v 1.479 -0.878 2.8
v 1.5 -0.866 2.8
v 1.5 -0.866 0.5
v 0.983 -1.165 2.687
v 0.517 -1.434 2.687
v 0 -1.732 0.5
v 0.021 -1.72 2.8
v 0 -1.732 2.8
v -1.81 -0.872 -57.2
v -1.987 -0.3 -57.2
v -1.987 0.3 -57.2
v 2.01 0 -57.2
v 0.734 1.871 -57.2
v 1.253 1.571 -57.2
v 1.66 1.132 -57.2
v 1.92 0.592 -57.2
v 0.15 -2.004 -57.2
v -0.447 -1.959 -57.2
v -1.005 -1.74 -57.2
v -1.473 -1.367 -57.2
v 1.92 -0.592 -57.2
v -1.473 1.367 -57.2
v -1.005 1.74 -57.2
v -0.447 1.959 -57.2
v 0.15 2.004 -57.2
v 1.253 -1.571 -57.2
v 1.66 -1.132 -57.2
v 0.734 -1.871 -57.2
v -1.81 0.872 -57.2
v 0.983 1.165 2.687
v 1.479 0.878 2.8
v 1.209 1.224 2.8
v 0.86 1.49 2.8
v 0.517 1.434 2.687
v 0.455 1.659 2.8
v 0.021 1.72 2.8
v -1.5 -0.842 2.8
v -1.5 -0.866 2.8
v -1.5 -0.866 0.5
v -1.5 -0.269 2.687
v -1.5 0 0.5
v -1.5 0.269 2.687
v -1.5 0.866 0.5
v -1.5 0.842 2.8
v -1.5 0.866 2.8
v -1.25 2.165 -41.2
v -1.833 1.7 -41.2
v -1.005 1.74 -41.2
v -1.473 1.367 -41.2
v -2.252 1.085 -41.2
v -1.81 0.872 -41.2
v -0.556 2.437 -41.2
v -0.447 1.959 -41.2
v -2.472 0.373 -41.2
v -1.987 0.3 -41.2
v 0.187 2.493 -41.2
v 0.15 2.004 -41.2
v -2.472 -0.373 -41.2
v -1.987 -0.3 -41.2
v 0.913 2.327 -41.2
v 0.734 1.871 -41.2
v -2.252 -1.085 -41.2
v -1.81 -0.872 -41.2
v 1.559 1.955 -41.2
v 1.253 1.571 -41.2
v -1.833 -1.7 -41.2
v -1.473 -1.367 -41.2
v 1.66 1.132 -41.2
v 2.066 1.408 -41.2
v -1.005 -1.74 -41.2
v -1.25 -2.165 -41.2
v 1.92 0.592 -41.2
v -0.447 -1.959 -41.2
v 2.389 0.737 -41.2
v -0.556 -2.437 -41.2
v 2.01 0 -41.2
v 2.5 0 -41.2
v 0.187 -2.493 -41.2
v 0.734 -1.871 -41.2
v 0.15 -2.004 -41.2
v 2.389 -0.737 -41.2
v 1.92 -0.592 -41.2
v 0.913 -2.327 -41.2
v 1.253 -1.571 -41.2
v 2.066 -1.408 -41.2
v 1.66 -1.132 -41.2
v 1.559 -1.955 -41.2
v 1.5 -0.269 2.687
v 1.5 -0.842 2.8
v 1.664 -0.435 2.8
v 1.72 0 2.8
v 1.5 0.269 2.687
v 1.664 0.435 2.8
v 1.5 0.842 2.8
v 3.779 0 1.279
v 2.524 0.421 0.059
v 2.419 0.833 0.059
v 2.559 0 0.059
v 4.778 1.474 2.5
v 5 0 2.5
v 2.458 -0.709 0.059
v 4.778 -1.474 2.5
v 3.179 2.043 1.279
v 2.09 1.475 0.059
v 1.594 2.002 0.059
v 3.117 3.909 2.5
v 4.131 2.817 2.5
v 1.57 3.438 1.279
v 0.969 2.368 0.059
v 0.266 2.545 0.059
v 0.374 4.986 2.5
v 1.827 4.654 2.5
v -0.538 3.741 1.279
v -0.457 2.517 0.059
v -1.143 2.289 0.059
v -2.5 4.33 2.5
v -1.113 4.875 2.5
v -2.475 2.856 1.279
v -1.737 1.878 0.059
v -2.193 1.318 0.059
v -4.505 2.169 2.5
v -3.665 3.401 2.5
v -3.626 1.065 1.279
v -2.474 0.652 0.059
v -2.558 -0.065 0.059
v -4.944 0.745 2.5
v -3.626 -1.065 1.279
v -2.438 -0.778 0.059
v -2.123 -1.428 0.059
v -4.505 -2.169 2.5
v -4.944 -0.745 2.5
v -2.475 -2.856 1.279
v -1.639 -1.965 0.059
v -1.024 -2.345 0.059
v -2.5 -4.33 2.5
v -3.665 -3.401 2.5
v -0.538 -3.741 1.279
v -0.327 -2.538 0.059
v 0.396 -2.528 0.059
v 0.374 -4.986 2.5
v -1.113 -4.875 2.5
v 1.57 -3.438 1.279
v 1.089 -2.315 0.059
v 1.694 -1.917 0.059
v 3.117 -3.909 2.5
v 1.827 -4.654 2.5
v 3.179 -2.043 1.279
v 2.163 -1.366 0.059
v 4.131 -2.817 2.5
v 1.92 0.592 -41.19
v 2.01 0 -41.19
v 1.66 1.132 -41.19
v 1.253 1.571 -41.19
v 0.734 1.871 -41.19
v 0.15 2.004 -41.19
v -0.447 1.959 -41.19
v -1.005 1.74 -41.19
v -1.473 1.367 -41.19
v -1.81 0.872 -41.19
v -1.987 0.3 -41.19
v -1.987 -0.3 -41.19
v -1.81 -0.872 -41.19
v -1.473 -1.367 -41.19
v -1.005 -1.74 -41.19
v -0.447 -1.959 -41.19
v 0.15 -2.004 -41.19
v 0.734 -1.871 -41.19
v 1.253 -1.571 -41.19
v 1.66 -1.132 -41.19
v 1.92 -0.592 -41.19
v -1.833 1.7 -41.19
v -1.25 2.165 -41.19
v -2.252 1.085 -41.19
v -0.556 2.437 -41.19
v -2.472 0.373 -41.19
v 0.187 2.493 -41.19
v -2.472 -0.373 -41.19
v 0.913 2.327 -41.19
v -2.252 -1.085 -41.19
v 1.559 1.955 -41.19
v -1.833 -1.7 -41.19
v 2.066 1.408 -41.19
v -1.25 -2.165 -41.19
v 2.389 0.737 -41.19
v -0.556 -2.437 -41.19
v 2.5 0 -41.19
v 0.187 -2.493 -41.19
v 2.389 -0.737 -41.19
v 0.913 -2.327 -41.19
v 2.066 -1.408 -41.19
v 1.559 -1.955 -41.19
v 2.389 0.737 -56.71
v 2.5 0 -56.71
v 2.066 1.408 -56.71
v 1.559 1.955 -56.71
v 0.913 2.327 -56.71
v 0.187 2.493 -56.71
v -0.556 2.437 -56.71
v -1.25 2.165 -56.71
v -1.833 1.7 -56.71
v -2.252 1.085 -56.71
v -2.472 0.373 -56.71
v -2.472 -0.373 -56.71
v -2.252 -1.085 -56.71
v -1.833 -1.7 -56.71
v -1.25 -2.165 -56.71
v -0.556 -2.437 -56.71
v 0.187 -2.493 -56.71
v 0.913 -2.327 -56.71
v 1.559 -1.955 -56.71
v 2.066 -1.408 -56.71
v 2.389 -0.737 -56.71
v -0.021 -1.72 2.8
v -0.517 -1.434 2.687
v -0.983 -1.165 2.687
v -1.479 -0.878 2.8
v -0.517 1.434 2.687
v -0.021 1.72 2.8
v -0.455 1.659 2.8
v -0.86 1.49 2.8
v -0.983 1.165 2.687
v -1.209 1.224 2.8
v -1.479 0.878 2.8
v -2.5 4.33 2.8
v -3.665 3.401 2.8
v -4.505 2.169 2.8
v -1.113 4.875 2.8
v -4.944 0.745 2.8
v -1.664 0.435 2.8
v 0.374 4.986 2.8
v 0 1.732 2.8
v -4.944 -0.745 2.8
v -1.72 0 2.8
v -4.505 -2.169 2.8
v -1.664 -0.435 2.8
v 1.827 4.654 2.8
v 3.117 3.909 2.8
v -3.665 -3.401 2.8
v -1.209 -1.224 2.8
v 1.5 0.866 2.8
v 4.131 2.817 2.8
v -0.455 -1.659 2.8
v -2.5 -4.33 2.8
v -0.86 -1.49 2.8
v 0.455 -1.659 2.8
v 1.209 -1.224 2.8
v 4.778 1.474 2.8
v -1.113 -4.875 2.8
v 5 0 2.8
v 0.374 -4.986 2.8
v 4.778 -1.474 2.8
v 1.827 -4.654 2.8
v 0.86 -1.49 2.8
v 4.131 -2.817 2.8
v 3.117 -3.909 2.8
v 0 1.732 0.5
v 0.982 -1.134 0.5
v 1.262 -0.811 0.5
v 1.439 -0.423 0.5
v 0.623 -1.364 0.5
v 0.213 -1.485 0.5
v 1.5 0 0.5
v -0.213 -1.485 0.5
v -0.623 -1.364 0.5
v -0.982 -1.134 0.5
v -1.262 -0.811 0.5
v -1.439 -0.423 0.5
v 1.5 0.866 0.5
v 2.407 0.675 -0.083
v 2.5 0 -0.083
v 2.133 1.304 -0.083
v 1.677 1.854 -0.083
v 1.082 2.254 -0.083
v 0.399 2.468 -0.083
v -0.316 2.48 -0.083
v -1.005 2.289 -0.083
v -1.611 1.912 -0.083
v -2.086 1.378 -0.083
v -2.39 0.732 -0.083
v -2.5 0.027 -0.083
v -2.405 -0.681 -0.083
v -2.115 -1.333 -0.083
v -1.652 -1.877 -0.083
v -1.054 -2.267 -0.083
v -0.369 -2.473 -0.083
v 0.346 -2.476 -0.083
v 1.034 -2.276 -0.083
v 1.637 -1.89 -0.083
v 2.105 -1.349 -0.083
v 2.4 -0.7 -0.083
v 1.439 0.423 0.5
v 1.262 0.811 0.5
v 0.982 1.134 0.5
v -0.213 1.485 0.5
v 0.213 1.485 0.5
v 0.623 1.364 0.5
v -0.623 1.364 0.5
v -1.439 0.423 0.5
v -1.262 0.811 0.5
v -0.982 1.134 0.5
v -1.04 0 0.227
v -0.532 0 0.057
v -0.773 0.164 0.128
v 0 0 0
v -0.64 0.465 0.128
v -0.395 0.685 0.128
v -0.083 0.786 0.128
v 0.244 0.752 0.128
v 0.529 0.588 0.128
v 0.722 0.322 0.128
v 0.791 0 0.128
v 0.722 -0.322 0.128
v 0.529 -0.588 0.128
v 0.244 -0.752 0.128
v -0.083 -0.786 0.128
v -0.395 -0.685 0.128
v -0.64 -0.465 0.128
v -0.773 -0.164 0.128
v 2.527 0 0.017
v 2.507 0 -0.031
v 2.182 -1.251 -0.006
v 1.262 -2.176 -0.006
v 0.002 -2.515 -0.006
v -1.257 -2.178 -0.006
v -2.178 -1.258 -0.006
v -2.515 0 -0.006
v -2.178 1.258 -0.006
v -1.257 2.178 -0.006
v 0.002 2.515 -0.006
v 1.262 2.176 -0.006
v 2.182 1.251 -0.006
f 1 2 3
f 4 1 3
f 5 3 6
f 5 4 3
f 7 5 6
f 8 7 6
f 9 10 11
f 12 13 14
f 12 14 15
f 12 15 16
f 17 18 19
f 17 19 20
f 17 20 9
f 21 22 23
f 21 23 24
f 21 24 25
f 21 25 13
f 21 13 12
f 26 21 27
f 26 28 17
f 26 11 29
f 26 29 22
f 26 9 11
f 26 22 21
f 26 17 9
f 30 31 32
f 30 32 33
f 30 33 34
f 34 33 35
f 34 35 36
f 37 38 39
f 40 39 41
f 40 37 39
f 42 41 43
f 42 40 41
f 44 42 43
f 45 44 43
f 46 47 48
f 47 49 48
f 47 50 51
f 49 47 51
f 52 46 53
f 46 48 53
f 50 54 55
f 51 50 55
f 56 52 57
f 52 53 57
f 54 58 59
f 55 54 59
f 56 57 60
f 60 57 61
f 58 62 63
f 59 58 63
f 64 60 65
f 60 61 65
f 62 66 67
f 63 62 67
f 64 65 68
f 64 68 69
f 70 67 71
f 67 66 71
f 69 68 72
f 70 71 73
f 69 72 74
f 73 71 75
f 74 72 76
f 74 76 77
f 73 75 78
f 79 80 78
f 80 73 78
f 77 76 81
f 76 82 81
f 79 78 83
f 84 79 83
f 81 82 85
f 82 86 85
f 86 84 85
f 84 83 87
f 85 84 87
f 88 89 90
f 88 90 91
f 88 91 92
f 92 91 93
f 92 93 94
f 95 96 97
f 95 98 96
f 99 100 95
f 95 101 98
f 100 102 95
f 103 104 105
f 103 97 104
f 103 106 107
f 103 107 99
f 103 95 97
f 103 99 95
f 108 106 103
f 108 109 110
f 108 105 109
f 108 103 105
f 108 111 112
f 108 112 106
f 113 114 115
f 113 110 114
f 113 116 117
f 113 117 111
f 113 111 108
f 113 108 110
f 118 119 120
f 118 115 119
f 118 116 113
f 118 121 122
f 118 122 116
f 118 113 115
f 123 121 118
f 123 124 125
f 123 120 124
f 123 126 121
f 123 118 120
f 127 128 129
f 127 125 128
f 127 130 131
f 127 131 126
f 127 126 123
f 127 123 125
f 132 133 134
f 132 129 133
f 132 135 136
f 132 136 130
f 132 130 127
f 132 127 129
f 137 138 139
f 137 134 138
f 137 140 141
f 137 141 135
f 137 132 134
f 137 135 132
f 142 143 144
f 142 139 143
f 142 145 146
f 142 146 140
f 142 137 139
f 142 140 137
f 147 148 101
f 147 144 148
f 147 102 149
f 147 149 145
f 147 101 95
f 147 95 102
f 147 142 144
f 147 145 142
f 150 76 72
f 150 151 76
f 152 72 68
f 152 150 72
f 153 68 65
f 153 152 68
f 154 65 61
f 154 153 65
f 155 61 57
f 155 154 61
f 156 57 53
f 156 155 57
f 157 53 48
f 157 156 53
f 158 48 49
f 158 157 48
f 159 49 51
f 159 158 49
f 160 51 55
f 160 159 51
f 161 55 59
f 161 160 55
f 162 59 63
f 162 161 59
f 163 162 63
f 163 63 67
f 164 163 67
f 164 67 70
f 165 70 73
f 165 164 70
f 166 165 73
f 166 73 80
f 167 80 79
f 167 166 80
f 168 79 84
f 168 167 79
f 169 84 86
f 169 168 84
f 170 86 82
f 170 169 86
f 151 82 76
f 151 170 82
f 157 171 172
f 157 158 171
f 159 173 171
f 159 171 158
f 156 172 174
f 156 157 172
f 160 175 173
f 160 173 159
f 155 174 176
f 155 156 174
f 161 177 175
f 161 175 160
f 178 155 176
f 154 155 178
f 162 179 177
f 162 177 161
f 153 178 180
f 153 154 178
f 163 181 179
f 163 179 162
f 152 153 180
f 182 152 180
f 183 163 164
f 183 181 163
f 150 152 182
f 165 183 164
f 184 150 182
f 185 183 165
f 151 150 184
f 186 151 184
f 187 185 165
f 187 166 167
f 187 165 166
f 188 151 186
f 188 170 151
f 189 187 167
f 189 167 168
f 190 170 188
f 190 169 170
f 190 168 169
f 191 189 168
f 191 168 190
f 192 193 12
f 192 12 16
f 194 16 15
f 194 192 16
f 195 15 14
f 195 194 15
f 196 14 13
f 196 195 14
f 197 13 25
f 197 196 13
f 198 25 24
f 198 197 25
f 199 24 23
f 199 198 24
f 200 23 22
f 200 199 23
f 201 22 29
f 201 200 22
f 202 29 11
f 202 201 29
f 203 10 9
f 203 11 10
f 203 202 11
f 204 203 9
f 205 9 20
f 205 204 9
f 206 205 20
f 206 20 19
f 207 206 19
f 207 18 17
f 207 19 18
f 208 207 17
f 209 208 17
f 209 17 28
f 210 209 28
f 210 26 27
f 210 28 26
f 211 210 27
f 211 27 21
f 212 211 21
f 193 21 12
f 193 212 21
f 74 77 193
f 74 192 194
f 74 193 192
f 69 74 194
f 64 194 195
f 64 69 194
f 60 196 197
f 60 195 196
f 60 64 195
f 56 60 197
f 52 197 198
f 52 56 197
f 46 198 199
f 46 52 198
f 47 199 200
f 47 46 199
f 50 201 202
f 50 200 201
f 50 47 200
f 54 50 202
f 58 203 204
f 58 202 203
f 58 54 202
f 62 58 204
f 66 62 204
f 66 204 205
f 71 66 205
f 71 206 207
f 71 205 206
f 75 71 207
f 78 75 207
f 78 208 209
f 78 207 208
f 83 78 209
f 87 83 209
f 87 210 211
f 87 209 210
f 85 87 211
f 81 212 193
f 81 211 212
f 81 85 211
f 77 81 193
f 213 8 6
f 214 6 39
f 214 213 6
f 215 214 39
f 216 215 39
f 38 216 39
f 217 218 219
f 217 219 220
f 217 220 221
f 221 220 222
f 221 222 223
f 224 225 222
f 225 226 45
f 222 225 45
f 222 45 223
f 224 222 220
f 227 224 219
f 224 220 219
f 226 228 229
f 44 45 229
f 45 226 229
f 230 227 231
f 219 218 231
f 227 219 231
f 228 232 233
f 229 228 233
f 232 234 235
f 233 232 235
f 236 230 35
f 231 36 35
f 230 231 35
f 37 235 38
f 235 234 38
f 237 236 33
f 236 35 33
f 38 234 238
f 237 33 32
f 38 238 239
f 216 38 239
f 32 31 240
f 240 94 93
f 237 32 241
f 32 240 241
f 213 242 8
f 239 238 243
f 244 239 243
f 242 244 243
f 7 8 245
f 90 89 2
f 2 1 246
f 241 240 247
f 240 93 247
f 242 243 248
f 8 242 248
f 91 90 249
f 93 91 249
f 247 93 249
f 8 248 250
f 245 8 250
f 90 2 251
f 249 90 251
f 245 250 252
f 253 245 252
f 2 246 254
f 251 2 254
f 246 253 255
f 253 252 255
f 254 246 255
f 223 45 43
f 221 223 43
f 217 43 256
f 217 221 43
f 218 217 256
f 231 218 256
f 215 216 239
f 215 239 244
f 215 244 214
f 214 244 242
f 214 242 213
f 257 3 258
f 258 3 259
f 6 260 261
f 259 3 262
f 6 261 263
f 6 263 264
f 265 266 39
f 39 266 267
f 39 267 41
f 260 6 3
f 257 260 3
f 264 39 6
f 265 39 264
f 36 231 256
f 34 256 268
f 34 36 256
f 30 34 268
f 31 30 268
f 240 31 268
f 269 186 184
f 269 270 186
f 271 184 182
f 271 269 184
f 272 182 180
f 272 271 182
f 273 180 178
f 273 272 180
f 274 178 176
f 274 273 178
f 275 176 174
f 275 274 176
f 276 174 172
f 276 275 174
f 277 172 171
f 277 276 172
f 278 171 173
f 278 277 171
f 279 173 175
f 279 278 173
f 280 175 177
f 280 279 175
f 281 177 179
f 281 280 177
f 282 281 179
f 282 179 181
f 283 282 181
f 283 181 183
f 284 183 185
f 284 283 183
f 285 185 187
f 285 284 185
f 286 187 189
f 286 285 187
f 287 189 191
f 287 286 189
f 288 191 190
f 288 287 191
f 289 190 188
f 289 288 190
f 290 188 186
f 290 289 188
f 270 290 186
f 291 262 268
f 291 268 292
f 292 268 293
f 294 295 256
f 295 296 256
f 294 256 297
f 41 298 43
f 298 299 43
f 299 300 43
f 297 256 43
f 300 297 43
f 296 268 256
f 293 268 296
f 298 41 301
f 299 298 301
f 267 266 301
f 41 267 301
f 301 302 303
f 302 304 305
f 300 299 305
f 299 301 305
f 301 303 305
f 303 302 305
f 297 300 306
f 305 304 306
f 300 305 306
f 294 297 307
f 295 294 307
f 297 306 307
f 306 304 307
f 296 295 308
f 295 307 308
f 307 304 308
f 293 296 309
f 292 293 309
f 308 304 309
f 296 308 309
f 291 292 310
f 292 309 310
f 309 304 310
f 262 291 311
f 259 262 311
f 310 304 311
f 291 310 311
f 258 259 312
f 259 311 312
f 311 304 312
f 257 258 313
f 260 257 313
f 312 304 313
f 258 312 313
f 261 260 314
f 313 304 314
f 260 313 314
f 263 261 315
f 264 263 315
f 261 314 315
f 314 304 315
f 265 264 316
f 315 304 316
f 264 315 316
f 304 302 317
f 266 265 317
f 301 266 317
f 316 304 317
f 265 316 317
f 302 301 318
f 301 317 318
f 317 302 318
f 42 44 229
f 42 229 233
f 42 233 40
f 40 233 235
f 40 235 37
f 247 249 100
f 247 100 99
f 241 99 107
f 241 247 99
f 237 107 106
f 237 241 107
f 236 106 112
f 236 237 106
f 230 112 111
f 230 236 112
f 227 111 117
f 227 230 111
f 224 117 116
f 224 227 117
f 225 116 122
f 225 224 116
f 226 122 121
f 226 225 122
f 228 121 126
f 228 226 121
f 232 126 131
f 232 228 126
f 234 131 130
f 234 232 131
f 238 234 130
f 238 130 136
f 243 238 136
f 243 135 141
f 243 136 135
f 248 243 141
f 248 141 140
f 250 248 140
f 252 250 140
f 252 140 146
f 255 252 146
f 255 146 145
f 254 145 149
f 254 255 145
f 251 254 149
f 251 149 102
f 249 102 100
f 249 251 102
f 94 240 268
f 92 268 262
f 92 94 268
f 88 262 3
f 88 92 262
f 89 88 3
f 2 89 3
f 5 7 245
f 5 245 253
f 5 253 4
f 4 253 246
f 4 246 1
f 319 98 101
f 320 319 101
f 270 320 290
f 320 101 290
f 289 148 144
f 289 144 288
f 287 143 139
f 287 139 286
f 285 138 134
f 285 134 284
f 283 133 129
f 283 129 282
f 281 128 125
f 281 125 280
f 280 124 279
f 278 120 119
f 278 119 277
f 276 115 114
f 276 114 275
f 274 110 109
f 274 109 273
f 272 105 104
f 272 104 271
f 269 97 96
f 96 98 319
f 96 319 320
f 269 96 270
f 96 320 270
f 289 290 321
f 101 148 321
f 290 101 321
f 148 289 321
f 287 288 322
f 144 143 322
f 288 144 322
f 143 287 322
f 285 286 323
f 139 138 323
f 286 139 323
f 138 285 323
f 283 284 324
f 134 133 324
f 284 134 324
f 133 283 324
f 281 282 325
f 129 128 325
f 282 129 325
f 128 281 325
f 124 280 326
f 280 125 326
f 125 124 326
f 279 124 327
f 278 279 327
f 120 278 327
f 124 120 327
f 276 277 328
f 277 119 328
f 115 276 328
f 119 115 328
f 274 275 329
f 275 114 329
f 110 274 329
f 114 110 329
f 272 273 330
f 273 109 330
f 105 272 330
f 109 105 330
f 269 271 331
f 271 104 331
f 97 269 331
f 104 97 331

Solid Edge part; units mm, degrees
sketch "Sketch1" plane through (0, 0, 0) normal (0, -1, 0) x (1, 0, 0)
  line L0 (2.5, 0) -> (5, 2.5)
  line L1 (5, 2.5) -> (5, 2.8)
  line L2 (5, 2.8) -> (0, 2.8)
  line L3 (0, 2.8) -> (0, -57.2)
  line L4 (0, -57.2) -> (2.0095, -57.2)
  line L5 (2.0095, -57.2) -> (2.5, -56.7095)
  line L6 (2.5, -56.7095) -> (2.5, -41.2)
  line L7 (2.5, -41.2) -> (2.0095, -41.2)
  line L8 (2.0095, -41.2) -> (2.0095, -41.19)
  line L9 (2.0095, -41.19) -> (2.5, -41.19)
  line L10 (2.5, -41.19) -> (2.5, 0)
  dimension "D1" = 60
  dimension "D2" = 5
  dimension "D3" = 2.8
  dimension "D4" = 0.01
  dimension "D5" = 2.0095
  dimension "D6" = 44
  dimension "D7" = 0.3
revolve "RevolvedProtrusion1" add sketch "Sketch1" angle 360 about axis through (0, 0, 54) along (0, 0, -1)
sketch "Sketch2" plane through (0, 0, 0) normal (0, -1, 0) x (1, 0, 0)
  arc A0 (-1.5, 0.5) -> (0, 0) centre (0, 2.5) ccw
  line L0 (0, 0.5) -> (0, 0)
  line L1 (-1.5, 0.5) -> (0, 0.5)
  dimension "D1" = 57.7
revolve "RevolvedCutout1" cut sketch "Sketch2" angle 360 about axis through (0, 0, 54) along (0, 0, -1)
sketch "Sketch3" plane through (0, 0, 2.8) normal (0, 0, 1) x (0, -1, 0)
  line L0 (-1.7321, 0) -> (-0.866, 1.5)
  line L1 (-0.866, 1.5) -> (0.866, 1.5)
  line L2 (0.866, 1.5) -> (1.7321, 0)
  line L3 (1.7321, 0) -> (0.866, -1.5)
  line L4 (0.866, -1.5) -> (-0.866, -1.5)
  line L5 (-0.866, -1.5) -> (-1.7321, 0)
  dimension "D1" = 3
extrude "Cutout1" cut sketch "Sketch3" against normal blind 2.3
cosmetic_thread "Thread1" size "M5"
sketch "Sketch4" plane through (0, 0, 0) normal (1, 0, 0) x (0, 1, 0)
  line L0 (-1.72, 2.8) -> (0, 1.807)
revolve "RevolvedCutout2" cut sketch "Sketch4" angle 360 about axis through (0, 0, -57) along (0, 0, 1) material side at (0, -0.835, 2.3468)
fillet "Round1" radius 0.2 1 edges at (-2.5, 0, 0)
properties material "Stahl"
